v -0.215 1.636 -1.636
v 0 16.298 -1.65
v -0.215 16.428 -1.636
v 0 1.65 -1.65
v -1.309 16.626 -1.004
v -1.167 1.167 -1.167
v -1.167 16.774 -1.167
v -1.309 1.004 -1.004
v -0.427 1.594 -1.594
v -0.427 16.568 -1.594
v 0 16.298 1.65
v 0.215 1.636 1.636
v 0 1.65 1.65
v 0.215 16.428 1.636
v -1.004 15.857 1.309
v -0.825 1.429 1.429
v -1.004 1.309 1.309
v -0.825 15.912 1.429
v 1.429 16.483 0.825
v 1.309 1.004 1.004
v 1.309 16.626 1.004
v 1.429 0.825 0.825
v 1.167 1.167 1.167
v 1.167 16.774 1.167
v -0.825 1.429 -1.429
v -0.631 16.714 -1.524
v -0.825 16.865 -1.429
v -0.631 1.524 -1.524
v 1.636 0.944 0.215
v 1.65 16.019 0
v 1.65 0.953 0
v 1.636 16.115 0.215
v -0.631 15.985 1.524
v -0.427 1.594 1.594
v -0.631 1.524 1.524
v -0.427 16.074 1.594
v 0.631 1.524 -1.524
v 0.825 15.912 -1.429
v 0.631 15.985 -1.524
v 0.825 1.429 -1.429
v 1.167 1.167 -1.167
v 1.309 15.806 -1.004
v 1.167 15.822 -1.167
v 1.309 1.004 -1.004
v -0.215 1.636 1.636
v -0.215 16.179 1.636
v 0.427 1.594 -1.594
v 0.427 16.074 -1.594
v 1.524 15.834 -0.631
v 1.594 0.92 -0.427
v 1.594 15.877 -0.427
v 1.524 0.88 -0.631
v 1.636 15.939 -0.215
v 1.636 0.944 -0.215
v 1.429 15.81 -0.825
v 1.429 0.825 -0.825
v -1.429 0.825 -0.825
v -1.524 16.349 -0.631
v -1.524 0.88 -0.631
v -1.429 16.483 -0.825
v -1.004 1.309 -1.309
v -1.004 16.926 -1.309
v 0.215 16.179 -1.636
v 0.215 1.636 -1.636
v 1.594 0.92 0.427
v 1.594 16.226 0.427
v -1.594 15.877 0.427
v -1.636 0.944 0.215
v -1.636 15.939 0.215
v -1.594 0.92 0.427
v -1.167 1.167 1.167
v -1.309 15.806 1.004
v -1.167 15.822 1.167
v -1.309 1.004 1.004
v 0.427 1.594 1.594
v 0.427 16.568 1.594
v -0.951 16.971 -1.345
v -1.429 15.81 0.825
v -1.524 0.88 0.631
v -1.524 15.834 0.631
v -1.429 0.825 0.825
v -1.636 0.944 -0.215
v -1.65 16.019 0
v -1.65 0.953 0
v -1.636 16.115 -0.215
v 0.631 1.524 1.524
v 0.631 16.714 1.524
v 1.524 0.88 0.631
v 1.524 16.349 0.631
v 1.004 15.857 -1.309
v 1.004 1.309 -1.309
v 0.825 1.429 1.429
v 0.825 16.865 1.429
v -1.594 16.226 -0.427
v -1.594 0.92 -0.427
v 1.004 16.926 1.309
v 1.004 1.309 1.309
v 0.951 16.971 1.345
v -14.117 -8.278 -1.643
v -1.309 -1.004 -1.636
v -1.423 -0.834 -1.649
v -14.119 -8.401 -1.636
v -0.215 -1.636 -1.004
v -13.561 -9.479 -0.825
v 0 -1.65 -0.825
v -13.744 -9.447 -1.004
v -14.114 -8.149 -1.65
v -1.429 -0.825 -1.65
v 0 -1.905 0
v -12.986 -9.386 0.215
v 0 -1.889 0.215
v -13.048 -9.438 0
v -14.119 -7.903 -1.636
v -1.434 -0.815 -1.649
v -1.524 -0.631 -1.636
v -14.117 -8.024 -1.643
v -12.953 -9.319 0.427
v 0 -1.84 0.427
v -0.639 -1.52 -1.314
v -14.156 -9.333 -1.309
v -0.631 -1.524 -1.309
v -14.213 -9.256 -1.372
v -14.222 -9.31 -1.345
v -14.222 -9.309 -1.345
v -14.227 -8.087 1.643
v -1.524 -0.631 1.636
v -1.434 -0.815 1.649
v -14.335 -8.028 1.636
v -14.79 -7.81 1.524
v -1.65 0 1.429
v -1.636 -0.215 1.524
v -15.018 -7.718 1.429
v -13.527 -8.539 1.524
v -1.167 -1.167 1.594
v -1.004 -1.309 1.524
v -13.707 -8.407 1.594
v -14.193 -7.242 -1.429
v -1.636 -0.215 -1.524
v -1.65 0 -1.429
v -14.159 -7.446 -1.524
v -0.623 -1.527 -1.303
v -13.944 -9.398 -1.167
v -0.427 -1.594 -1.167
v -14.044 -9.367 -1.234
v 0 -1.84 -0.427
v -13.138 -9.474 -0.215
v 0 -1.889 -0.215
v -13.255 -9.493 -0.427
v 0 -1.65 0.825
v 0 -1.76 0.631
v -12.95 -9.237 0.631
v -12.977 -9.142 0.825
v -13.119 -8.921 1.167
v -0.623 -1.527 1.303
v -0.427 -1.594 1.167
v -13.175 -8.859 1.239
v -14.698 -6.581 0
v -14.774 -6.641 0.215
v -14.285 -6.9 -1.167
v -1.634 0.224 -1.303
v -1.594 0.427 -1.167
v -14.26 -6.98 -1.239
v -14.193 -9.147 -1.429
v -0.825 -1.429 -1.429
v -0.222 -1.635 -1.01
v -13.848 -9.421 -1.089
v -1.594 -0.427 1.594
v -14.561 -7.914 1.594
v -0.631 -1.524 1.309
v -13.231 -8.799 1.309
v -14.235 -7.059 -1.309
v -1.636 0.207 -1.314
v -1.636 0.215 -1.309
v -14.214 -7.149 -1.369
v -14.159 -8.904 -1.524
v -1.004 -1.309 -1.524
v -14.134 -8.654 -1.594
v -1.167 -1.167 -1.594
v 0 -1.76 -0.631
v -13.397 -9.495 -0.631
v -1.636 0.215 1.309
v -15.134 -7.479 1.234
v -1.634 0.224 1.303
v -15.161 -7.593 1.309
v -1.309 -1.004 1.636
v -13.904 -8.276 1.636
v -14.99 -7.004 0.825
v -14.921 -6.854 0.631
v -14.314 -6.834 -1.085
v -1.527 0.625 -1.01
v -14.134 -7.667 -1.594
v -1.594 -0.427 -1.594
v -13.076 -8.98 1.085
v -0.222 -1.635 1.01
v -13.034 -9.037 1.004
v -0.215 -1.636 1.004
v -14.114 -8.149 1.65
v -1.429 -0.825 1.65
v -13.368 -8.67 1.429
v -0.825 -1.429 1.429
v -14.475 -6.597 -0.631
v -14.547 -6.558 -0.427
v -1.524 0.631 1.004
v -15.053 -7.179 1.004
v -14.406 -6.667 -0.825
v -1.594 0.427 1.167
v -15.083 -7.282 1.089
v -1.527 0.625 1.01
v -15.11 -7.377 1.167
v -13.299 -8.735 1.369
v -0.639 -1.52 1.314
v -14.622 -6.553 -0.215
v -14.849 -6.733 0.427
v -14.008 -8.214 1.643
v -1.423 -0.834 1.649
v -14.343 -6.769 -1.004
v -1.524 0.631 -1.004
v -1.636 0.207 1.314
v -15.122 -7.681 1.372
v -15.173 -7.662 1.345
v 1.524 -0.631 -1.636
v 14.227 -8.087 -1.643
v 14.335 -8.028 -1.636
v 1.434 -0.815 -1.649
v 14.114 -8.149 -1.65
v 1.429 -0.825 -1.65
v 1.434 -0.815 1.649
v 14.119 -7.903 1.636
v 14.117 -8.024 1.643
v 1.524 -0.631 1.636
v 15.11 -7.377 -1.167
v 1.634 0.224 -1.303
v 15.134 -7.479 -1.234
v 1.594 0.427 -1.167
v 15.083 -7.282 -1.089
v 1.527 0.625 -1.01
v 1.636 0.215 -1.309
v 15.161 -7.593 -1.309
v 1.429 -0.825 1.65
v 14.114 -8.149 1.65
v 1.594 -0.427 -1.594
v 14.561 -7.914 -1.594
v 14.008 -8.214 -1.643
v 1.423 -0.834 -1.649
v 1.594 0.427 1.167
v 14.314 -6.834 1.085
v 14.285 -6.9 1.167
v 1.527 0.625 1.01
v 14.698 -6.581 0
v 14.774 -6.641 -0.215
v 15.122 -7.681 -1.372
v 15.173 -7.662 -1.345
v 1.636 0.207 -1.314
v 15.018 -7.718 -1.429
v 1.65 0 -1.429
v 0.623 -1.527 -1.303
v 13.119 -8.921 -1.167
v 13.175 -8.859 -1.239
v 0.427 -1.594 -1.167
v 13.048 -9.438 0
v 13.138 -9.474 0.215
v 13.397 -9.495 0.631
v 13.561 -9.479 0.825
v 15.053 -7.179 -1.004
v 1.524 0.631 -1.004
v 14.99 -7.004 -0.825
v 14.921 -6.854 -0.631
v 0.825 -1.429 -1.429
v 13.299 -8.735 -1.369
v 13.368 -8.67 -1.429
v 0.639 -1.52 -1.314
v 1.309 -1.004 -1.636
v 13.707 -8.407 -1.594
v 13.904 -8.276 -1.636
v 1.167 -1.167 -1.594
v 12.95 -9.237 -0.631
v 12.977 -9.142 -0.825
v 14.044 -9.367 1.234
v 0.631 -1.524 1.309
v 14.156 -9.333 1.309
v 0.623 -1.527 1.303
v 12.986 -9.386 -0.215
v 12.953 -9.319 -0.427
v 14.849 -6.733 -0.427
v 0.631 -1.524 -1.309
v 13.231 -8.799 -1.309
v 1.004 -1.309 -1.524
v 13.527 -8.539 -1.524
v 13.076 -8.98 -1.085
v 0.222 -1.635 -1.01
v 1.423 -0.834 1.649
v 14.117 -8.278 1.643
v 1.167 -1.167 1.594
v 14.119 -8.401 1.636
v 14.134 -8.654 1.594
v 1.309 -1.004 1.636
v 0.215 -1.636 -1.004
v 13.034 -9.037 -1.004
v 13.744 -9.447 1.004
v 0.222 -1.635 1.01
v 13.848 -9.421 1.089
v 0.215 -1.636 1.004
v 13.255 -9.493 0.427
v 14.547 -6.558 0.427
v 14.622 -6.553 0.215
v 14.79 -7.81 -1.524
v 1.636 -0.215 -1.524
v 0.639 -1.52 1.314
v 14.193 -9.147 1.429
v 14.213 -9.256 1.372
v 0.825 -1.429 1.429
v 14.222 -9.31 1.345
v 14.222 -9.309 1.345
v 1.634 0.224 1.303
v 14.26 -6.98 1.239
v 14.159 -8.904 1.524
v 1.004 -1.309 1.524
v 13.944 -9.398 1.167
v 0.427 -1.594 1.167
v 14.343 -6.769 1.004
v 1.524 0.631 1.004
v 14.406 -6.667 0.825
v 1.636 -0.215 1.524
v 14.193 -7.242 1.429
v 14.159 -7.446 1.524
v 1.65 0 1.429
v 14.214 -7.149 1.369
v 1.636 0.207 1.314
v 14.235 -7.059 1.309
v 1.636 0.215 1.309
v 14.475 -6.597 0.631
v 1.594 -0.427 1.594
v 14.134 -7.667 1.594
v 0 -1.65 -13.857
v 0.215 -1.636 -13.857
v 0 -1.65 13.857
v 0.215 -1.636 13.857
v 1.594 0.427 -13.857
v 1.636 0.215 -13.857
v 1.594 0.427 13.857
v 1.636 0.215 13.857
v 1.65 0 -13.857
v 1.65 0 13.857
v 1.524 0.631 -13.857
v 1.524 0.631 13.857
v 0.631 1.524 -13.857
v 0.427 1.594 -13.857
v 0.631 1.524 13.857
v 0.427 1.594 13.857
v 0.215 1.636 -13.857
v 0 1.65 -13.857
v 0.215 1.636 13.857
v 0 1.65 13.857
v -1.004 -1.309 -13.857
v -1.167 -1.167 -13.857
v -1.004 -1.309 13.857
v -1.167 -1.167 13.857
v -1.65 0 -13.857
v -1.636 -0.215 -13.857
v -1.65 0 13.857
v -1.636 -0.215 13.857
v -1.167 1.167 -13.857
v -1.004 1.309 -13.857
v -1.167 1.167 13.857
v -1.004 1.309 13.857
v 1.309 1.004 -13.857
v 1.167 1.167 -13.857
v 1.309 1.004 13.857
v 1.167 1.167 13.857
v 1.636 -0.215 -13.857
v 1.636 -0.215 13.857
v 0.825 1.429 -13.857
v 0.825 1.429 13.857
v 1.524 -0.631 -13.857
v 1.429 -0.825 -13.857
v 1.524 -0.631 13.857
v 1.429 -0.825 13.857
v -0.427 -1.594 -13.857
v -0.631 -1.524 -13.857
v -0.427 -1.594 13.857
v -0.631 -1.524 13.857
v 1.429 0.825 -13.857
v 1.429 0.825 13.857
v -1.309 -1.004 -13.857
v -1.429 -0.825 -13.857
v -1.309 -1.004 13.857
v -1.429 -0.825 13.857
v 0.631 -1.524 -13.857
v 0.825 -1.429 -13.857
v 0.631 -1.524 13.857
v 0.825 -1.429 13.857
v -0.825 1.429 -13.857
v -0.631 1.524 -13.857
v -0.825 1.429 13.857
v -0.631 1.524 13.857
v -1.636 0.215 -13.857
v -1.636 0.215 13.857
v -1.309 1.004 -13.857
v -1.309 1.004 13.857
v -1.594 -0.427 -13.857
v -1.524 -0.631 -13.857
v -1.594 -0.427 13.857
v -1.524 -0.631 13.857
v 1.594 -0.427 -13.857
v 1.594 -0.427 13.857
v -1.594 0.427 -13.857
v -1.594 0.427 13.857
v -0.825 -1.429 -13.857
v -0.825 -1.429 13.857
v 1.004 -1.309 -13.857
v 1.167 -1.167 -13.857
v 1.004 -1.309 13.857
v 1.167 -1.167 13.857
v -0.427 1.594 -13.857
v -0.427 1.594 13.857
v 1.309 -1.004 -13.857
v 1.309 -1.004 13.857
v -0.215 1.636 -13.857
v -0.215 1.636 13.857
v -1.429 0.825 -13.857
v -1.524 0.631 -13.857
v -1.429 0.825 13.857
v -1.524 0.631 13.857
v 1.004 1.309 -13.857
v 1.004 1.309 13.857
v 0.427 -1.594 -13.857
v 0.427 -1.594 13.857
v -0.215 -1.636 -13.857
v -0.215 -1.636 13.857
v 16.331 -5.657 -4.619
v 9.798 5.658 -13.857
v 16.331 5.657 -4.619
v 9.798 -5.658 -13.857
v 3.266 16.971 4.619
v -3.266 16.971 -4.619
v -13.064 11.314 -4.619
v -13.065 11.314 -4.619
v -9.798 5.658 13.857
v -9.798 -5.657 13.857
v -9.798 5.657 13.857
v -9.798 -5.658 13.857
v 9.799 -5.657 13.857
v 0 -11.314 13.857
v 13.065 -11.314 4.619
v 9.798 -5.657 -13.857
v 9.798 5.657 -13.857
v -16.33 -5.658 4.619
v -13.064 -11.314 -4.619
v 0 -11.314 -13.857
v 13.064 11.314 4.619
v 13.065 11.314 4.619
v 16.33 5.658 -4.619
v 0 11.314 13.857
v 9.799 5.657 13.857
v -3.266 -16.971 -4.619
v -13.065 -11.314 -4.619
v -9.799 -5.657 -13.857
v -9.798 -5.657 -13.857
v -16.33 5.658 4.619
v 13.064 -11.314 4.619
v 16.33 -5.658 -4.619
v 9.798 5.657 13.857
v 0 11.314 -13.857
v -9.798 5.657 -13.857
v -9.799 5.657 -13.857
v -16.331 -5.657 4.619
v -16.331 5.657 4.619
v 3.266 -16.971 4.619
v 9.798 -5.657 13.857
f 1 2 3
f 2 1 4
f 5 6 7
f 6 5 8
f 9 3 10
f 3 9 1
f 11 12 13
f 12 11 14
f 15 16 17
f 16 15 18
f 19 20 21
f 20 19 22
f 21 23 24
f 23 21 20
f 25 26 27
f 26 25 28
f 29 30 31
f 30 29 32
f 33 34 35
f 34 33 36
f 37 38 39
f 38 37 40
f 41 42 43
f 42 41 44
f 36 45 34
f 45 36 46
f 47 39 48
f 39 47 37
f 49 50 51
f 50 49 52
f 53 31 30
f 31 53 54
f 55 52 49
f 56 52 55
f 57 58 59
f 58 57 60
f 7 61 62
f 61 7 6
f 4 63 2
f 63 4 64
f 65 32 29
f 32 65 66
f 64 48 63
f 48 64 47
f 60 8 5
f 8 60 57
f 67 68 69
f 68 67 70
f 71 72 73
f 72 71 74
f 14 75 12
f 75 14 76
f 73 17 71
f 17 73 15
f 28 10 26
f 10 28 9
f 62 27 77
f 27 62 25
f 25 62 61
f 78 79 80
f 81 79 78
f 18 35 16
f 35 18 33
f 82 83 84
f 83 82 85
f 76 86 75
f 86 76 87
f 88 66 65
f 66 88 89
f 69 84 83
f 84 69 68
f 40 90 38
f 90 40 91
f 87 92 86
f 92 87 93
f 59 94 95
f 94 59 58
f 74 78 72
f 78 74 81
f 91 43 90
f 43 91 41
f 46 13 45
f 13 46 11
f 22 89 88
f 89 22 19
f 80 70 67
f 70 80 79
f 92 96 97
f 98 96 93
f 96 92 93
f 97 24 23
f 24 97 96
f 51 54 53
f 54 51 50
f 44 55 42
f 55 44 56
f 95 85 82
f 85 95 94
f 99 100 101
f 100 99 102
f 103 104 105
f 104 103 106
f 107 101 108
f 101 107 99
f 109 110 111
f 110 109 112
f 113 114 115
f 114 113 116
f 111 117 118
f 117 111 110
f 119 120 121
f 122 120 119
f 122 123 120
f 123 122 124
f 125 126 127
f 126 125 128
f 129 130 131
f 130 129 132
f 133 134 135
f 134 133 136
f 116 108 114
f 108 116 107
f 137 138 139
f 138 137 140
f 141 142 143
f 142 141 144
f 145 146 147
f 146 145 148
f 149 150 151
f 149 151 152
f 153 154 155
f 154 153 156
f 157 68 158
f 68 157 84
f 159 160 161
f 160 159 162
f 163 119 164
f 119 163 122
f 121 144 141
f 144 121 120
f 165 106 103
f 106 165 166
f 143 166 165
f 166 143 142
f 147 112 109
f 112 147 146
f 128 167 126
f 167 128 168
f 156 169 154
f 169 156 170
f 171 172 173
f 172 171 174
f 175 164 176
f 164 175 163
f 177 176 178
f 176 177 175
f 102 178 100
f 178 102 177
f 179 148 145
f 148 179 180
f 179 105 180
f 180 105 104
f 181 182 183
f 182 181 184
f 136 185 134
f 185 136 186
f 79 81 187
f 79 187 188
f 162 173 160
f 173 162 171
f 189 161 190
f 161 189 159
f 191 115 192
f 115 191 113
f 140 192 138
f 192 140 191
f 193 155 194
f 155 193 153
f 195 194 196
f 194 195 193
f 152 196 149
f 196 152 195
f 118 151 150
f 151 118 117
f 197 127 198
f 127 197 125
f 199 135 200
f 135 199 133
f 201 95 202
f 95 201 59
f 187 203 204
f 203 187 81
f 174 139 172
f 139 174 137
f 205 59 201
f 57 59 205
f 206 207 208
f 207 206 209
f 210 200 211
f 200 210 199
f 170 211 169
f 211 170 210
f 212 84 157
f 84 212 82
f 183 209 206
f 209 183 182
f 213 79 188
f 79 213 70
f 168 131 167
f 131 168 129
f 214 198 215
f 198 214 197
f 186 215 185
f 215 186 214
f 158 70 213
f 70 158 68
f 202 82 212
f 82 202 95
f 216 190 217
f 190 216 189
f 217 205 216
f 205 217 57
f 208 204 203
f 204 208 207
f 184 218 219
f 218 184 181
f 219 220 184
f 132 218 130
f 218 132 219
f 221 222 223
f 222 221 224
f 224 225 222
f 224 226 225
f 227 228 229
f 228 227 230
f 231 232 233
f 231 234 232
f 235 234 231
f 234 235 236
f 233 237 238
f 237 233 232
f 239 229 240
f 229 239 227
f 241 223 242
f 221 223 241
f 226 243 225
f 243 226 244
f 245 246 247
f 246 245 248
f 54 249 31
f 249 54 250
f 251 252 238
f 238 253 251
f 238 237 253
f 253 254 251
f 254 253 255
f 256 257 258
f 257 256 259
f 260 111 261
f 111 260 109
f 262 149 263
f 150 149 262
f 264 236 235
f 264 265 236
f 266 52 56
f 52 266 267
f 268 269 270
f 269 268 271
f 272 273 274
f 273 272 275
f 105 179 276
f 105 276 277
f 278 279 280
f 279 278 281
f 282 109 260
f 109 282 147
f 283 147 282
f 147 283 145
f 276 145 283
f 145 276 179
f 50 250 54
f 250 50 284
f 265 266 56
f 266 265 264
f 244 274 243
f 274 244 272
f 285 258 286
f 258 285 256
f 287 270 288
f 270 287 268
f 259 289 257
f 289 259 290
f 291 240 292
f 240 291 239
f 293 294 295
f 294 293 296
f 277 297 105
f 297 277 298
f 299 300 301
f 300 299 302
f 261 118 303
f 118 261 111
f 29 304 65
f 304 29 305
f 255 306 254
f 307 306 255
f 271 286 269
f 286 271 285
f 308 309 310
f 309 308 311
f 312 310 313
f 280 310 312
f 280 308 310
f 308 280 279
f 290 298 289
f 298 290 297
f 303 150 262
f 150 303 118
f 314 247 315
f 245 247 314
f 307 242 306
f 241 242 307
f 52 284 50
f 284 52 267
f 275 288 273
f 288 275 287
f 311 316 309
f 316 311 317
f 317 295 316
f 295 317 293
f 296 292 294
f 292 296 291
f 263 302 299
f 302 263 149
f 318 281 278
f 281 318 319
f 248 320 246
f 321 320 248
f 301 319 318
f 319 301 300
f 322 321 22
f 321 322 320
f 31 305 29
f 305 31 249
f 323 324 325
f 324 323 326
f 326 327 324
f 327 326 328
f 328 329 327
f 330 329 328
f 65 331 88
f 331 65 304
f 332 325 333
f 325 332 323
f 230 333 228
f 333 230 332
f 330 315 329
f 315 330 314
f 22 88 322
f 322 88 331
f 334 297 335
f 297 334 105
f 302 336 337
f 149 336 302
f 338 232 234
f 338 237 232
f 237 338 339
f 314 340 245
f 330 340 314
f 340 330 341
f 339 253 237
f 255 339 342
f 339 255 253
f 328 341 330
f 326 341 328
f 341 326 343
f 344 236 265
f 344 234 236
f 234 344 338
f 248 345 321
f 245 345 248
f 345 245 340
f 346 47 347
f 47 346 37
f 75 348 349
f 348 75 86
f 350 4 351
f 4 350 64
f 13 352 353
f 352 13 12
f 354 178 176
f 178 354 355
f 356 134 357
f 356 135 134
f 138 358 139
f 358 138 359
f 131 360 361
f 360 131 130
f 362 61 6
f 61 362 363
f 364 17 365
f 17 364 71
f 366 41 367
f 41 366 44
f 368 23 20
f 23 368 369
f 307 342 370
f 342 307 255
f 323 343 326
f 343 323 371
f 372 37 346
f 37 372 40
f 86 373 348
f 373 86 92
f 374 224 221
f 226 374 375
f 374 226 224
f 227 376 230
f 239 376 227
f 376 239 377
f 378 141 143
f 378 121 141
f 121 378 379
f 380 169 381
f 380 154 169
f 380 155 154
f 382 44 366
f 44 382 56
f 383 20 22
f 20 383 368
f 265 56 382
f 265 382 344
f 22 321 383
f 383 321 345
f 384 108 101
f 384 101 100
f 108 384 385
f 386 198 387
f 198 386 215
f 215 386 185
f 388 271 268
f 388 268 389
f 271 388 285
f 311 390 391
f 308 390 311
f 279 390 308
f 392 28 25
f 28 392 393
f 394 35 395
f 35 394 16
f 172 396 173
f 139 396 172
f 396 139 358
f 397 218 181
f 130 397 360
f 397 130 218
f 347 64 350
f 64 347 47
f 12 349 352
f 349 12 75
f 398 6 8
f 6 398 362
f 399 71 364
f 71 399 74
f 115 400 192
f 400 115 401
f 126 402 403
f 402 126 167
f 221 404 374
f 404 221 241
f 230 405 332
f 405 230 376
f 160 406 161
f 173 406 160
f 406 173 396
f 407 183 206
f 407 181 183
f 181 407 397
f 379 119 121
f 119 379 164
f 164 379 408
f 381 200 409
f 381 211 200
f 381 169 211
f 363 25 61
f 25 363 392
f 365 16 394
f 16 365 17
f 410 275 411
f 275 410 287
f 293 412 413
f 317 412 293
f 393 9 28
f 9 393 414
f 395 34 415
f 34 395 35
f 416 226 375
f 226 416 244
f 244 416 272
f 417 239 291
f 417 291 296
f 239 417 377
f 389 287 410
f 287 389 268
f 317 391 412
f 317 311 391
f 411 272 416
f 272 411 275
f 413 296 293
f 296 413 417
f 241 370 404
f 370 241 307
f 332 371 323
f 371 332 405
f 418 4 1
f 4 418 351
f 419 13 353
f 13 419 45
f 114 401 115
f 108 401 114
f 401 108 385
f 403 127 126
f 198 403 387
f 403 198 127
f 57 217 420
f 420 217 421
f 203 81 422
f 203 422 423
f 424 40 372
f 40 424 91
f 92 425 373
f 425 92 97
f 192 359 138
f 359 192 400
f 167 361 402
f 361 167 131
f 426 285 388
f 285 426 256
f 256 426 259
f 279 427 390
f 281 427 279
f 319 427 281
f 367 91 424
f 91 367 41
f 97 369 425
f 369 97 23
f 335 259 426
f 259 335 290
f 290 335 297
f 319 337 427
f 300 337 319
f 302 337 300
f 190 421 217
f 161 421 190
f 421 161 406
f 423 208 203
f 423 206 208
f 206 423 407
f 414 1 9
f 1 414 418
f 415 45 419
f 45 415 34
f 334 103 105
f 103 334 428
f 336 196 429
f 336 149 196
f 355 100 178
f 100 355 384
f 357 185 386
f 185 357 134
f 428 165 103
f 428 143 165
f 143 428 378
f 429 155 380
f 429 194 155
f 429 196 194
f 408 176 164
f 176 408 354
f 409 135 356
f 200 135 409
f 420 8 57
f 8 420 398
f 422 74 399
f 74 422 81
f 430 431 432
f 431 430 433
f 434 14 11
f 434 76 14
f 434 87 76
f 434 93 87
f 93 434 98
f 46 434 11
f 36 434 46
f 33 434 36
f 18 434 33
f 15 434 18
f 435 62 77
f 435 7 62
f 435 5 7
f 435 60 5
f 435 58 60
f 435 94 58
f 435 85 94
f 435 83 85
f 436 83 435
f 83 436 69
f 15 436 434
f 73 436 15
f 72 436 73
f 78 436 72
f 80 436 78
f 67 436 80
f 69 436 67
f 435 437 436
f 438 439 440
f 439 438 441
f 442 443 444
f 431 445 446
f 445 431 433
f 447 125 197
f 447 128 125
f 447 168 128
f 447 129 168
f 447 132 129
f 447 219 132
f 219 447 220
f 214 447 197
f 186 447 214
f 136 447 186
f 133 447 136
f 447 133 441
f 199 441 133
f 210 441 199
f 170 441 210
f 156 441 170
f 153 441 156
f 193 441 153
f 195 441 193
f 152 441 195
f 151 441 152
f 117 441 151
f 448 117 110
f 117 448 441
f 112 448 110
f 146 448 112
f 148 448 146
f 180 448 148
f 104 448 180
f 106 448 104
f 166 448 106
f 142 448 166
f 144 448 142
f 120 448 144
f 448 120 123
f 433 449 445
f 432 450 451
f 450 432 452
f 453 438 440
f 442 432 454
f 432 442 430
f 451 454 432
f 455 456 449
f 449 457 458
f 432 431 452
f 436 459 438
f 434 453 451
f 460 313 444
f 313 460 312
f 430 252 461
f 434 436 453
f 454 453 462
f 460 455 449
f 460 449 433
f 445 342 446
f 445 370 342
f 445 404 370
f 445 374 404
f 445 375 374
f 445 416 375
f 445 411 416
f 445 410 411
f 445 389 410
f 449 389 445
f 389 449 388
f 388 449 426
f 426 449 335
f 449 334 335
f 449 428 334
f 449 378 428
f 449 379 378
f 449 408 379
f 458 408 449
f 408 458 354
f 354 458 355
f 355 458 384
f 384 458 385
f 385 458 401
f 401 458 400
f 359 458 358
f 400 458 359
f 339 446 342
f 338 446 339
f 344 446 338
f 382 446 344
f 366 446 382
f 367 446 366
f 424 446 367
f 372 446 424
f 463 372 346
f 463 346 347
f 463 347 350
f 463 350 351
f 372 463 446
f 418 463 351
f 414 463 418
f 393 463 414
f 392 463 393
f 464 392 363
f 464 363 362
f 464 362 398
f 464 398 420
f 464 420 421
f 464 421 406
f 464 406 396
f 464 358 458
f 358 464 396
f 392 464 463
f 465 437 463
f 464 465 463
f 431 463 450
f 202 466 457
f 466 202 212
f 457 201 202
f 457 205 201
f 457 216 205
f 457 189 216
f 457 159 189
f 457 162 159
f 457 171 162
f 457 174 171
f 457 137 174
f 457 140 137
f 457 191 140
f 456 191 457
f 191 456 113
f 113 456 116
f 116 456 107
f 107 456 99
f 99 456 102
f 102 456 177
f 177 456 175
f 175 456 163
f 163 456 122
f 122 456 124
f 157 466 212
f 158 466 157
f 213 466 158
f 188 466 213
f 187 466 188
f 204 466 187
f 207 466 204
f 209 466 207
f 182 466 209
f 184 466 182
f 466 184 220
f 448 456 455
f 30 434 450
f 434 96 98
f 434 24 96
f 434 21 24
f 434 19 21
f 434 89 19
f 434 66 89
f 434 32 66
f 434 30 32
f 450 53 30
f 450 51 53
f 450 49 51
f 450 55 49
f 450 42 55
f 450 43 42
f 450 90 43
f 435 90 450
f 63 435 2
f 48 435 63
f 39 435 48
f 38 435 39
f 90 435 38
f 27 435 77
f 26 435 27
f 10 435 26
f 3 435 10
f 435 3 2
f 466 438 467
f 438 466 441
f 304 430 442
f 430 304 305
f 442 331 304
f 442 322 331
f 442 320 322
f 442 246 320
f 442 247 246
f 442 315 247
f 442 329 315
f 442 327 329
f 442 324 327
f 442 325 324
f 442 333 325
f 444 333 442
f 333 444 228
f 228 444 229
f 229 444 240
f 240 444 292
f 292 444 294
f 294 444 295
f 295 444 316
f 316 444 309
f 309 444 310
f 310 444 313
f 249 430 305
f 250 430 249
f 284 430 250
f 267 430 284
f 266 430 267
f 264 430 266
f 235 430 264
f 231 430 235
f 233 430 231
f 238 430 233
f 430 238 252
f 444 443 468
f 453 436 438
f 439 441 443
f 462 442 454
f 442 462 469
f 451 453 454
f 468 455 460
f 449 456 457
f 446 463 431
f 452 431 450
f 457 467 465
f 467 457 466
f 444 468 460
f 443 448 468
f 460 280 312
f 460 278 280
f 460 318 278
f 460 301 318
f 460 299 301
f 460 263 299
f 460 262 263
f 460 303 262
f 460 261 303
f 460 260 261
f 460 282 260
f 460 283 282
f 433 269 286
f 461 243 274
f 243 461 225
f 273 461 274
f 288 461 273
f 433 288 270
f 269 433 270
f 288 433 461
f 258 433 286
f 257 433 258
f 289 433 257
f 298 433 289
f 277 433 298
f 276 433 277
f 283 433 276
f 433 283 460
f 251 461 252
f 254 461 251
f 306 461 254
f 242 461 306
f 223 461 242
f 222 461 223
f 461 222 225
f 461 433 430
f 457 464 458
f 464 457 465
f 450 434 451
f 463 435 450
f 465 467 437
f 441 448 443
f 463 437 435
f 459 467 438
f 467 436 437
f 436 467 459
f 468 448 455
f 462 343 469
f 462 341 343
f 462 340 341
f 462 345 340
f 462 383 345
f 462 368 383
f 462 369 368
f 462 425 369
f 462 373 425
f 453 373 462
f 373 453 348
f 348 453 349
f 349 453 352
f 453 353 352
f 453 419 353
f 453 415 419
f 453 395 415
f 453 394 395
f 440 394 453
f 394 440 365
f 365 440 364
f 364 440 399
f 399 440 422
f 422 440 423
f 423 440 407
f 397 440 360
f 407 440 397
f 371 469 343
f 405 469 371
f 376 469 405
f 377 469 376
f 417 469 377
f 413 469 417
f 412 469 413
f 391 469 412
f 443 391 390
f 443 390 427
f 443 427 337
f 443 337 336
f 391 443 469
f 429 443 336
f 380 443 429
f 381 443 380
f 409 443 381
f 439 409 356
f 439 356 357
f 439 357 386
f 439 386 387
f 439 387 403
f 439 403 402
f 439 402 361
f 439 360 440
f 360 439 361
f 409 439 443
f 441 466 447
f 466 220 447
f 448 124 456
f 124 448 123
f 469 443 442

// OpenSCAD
// ============================================================
//  Conector Tetradecaedro VERSIÓN 1 (octaedro truncado, modelo original)
//  - Conductos redondos horizontales a 120° para palillos de 3 mm
//    (dos palillos a 120° = vértice de un hexágono; con 3 conductos
//     también sirve para una malla de hexágonos / panal)
//  - Orificio vertical central pasante (arriba y abajo) para otra unión
//  La cara hexagonal queda hacia arriba/abajo (impresión 3D cómoda).
// ============================================================

// ---------- Parámetros ----------
d_palillo   = 3;      // diámetro del palillo (mm)
holgura     = 0.3;    // holgura para impresión 3D (mm)
escala      = 8;      // tamaño: arista del poliedro = escala * 1.414 mm
n_horiz     = 3;      // nº de conductos horizontales a 120° (3 = 0/120/240; 2 = solo un ángulo de 120°)
ang_inicio  = 90;     // ángulo del primer conducto (°)
prof_horiz  = 0;      // profundidad de cada conducto horizontal desde el centro (0 = pasante hasta la superficie)
prof_vert   = 0;      // profundidad del orificio vertical (0 = pasante arriba y abajo)
corte       = false;  // true = corta el modelo por la mitad para ver los conductos
ver_palillos= false;  // true = muestra palillos de ejemplo (solo vista previa)
$fn = 48;

d_hueco = d_palillo + holgura;
R_total = 4 * escala;   // longitud suficiente para atravesar el sólido

// ---------- Tetradecaedro ----------
// Vértices: todas las permutaciones de (0, ±1, ±2)
perms = [[0,1,2],[0,2,1],[1,0,2],[1,2,0],[2,0,1],[2,1,0]];
puntos = [for (p = perms, sx = [-1,1], sy = [-1,1], sz = [-1,1])
            [p[0]*sx, p[1]*sy, p[2]*sz] * escala];

module tetradecaedro_base() {
    hull() for (p = puntos) translate(p) cube(0.001, center = true);
}

// Gira el sólido para que una cara hexagonal (eje 1,1,1) quede hacia arriba
module tetradecaedro() {
    rotate([0, -atan(sqrt(2)), 0])
        rotate([0, 0, -45])
            tetradecaedro_base();
}

// ---------- Conductos ----------
module conductos() {
    // Horizontales a 120°
    for (i = [0 : n_horiz - 1])
        rotate([0, 0, ang_inicio + i * 120])
            rotate([0, 90, 0])
                cylinder(d = d_hueco, h = prof_horiz > 0 ? prof_horiz : R_total);

    // Vertical central (arriba y abajo)
    if (prof_vert > 0) {
        cylinder(d = d_hueco, h = prof_vert);
        mirror([0,0,1]) cylinder(d = d_hueco, h = prof_vert);
    } else {
        cylinder(d = d_hueco, h = R_total, center = true);
    }
}

// ---------- Pieza final ----------
module conector() {
    difference() {
        tetradecaedro();
        conductos();
        if (corte) translate([-100, -200, -100]) cube([200, 200, 200]); // quita y<0
    }
}

conector();

if (ver_palillos) %union() {
    for (i = [0 : n_horiz - 1])
        rotate([0, 0, ang_inicio + i * 120])
            rotate([0, 90, 0])
                cylinder(d = d_palillo, h = 3 * escala);
    cylinder(d = d_palillo, h = 3 * escala, center = true);
}
